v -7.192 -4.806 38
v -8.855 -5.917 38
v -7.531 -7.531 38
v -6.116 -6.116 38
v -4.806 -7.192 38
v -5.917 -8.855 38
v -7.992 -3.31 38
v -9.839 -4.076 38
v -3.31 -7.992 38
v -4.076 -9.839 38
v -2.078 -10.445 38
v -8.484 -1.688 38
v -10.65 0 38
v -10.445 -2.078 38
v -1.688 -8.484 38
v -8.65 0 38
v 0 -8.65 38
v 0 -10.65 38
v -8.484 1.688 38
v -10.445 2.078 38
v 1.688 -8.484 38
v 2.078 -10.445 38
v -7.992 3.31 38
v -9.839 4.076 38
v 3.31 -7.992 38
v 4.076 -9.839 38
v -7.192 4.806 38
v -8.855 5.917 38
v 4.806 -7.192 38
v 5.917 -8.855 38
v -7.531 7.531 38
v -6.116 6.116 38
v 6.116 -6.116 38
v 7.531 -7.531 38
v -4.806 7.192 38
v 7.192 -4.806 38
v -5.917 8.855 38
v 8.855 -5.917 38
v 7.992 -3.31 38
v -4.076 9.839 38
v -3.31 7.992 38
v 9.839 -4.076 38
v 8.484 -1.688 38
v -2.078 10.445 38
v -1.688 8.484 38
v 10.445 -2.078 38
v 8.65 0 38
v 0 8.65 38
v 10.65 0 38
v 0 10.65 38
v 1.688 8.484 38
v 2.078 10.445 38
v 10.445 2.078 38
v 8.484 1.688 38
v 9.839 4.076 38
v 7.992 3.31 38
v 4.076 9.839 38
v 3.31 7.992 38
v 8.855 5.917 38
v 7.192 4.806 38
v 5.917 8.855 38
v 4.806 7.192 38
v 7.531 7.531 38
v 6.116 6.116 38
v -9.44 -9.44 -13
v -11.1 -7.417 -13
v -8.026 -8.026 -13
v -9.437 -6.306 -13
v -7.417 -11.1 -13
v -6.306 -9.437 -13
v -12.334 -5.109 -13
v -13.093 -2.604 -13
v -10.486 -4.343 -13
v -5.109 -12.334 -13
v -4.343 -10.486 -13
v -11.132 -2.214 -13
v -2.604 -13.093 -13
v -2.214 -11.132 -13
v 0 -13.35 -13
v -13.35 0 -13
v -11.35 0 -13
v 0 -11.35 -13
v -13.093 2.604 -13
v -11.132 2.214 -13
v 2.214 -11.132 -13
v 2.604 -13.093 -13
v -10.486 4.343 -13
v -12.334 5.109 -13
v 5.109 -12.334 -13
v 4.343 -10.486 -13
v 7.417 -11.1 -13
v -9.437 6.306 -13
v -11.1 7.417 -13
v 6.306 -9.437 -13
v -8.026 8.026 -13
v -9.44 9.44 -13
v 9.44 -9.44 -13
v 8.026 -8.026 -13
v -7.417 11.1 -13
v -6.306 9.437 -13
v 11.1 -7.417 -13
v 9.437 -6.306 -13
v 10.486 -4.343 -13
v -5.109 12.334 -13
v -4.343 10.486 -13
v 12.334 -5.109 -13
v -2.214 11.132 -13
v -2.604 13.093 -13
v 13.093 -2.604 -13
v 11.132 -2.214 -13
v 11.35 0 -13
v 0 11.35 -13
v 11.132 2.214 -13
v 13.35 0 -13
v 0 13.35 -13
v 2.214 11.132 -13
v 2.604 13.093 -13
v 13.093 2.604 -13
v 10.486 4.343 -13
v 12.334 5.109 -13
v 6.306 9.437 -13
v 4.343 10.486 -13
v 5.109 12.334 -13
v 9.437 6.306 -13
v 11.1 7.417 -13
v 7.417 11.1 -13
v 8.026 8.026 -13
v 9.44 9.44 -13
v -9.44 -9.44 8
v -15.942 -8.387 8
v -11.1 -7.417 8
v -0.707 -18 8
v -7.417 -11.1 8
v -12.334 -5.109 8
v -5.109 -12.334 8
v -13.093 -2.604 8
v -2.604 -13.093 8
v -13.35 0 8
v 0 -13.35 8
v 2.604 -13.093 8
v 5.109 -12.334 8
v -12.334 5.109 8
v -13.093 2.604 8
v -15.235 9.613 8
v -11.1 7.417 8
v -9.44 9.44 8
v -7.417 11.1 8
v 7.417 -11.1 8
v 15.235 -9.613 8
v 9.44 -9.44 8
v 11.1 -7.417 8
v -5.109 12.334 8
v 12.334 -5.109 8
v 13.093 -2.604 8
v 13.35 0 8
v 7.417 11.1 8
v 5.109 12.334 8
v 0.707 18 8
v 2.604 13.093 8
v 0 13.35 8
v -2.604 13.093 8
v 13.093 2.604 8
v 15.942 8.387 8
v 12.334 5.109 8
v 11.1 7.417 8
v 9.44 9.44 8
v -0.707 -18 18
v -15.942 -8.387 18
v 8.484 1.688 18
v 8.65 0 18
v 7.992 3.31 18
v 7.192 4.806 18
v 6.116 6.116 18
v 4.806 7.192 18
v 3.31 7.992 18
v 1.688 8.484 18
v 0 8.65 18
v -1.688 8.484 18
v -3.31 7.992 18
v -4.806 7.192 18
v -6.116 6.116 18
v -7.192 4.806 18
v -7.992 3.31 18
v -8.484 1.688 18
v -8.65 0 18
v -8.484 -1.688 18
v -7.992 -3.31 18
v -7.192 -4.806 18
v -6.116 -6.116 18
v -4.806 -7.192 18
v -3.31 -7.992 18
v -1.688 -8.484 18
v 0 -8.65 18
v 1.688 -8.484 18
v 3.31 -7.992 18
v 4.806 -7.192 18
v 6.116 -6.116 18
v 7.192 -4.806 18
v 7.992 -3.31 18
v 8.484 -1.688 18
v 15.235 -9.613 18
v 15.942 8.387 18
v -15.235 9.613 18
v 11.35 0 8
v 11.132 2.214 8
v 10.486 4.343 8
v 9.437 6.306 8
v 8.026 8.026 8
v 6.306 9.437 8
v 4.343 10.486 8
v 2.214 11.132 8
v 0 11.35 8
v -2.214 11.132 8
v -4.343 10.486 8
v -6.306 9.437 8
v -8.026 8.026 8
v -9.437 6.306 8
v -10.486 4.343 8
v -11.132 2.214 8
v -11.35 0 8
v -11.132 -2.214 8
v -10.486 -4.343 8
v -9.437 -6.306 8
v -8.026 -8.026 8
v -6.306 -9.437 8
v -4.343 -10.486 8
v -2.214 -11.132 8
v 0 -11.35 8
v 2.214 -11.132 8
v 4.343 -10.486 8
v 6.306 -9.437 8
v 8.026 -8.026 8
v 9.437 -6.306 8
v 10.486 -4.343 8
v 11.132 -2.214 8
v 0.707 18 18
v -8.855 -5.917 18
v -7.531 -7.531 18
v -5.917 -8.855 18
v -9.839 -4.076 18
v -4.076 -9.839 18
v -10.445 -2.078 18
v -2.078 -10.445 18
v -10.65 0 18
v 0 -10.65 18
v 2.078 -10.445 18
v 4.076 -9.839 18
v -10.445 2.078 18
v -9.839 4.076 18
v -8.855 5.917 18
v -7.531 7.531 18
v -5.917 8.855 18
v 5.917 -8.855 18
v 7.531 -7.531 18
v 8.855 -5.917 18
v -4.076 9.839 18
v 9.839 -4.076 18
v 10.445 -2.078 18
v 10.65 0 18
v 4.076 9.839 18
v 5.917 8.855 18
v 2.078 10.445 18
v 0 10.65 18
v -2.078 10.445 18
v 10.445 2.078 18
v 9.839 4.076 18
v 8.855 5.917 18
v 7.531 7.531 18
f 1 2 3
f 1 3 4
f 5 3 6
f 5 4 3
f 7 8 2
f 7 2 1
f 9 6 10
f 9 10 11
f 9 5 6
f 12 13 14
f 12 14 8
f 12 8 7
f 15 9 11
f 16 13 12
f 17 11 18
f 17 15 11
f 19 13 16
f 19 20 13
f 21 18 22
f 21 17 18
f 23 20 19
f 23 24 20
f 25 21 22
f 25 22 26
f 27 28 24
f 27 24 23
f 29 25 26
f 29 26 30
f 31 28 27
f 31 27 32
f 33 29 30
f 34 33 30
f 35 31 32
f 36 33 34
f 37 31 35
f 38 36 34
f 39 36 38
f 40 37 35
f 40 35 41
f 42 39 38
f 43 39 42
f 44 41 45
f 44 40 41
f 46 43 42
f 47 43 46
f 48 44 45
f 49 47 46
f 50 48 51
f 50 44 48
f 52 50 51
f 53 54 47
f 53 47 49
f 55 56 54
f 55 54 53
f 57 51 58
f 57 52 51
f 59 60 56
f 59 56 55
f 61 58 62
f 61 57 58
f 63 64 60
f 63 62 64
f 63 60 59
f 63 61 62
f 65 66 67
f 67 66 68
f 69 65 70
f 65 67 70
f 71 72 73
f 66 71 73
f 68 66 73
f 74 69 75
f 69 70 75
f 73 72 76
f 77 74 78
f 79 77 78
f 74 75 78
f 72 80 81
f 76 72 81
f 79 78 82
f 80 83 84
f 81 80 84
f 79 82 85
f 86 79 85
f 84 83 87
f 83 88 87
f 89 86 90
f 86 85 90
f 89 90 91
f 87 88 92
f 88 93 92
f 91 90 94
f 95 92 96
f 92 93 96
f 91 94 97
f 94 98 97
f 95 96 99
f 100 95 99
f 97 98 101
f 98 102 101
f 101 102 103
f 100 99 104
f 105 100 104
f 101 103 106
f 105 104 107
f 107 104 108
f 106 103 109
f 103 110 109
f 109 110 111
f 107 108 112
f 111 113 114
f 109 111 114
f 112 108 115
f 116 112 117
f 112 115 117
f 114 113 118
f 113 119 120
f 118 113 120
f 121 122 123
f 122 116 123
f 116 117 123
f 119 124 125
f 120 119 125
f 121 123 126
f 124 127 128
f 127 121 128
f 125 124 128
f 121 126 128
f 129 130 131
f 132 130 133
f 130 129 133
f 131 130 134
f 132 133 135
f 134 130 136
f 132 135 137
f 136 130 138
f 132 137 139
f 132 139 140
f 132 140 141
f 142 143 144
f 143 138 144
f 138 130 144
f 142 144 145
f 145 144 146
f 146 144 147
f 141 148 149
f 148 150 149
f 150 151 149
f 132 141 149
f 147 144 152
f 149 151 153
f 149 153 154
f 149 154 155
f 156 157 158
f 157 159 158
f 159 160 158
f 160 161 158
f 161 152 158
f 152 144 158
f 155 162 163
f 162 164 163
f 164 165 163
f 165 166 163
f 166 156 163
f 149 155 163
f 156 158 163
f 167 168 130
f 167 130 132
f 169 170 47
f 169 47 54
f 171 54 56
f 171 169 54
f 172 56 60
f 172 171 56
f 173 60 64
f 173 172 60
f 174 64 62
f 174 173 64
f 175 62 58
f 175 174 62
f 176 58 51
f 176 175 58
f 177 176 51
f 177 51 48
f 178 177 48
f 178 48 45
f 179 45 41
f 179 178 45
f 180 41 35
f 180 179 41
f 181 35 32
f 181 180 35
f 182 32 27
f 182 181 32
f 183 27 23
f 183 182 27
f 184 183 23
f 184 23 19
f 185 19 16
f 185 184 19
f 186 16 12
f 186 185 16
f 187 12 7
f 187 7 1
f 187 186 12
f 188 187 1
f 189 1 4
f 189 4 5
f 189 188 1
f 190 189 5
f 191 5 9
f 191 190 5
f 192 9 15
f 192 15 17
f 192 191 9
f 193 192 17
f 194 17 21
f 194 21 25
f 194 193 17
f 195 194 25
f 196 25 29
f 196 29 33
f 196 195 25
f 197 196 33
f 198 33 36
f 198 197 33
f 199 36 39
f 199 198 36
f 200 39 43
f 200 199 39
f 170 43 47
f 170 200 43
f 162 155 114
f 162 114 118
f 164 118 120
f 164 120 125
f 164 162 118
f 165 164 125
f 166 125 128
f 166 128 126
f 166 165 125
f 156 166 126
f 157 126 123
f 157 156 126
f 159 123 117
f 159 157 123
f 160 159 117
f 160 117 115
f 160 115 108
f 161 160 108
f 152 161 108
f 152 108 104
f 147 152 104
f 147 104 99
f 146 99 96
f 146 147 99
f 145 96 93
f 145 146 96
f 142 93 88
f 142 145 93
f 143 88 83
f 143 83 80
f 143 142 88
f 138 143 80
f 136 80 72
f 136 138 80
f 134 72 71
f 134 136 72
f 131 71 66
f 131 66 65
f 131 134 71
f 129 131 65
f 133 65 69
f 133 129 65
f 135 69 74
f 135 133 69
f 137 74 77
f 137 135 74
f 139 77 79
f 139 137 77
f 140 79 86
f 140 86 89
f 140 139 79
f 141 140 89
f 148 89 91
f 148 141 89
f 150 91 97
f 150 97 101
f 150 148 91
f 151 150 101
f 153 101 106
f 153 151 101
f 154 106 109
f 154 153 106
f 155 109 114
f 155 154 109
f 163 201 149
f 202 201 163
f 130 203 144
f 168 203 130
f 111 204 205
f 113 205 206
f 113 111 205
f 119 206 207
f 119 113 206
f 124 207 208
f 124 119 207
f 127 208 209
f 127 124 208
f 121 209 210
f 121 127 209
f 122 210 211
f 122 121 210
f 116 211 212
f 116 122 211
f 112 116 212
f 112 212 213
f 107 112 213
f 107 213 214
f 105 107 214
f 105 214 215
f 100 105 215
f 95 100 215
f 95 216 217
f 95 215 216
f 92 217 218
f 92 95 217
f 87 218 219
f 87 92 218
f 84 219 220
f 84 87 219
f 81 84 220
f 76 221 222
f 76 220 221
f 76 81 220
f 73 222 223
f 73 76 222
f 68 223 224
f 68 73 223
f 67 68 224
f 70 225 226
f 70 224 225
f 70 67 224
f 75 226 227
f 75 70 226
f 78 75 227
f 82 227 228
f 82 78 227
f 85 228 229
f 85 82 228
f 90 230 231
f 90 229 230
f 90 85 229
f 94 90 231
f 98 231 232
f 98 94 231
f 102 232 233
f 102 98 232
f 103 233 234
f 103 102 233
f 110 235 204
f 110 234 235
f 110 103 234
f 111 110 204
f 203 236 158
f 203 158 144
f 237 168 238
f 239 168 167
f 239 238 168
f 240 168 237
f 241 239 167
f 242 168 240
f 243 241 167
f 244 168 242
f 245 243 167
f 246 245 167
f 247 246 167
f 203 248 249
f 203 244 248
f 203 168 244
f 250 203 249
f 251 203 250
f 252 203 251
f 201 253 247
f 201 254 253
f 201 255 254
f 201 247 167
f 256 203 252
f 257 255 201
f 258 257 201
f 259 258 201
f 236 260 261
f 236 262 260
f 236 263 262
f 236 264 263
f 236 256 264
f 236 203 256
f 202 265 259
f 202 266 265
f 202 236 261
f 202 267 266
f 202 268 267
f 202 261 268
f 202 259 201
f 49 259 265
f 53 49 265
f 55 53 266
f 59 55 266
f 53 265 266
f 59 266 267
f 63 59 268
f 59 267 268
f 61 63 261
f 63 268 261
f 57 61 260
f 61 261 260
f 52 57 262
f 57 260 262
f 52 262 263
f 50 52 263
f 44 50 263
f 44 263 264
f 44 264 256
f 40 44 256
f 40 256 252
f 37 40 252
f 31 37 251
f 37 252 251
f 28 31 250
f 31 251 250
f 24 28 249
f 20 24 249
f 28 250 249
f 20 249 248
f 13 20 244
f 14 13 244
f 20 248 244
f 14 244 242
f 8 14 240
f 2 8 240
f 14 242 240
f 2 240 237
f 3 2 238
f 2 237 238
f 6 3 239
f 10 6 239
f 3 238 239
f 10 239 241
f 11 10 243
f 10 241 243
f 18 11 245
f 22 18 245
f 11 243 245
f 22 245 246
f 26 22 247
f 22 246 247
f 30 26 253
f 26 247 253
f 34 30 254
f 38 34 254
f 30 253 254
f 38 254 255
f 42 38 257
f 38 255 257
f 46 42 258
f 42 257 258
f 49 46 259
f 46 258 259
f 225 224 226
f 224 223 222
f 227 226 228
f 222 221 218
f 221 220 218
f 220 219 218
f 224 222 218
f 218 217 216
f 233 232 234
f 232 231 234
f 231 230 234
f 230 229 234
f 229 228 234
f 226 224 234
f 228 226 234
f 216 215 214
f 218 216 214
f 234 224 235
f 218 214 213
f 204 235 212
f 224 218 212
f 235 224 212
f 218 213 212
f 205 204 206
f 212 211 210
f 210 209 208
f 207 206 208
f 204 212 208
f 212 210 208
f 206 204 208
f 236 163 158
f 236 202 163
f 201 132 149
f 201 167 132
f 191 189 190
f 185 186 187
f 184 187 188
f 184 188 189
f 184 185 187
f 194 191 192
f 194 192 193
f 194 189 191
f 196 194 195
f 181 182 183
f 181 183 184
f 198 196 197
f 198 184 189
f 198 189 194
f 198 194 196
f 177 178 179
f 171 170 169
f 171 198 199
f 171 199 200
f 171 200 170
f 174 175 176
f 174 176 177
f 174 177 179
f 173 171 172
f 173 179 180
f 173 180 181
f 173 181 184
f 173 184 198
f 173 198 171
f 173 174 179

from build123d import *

# Parameters (mm, degrees)
SKETCH1_R           = 13.35
SKETCH1_R_2         = 11.35
EXTRUDE_THIN1_DEPTH = 13
BOSS_EXTRUDE1_DEPTH = 5
SKETCH3_R           = 10.65
SKETCH3_R_2         = 8.65
EXTRUDE_THIN2_DEPTH = 20


with BuildPart() as part:
    # Sketch1 → Extrude-Thin1 (new, symmetric)
    with BuildSketch(Plane.XY):
        Circle(SKETCH1_R)
        Circle(SKETCH1_R_2, mode=Mode.SUBTRACT)
    extrude(amount=EXTRUDE_THIN1_DEPTH, both=True)

    # Sketch2 → Boss-Extrude1 (add, symmetric)
    with BuildSketch(Plane.XY.offset(13)):
        Polygon((15.942171509, 8.387348964), (0.707428481, 18), (-15.234743028, 9.612651036), (-15.942171509, -8.387348964), (-0.707428481, -18), (15.234743028, -9.612651036), align=None)
    extrude(amount=BOSS_EXTRUDE1_DEPTH, both=True)

    # Sketch3 → Extrude-Thin2 (add)
    with BuildSketch(Plane.XY.offset(18)):
        Circle(SKETCH3_R)
        Circle(SKETCH3_R_2, mode=Mode.SUBTRACT)
    extrude(amount=EXTRUDE_THIN2_DEPTH)


solid = part.part
